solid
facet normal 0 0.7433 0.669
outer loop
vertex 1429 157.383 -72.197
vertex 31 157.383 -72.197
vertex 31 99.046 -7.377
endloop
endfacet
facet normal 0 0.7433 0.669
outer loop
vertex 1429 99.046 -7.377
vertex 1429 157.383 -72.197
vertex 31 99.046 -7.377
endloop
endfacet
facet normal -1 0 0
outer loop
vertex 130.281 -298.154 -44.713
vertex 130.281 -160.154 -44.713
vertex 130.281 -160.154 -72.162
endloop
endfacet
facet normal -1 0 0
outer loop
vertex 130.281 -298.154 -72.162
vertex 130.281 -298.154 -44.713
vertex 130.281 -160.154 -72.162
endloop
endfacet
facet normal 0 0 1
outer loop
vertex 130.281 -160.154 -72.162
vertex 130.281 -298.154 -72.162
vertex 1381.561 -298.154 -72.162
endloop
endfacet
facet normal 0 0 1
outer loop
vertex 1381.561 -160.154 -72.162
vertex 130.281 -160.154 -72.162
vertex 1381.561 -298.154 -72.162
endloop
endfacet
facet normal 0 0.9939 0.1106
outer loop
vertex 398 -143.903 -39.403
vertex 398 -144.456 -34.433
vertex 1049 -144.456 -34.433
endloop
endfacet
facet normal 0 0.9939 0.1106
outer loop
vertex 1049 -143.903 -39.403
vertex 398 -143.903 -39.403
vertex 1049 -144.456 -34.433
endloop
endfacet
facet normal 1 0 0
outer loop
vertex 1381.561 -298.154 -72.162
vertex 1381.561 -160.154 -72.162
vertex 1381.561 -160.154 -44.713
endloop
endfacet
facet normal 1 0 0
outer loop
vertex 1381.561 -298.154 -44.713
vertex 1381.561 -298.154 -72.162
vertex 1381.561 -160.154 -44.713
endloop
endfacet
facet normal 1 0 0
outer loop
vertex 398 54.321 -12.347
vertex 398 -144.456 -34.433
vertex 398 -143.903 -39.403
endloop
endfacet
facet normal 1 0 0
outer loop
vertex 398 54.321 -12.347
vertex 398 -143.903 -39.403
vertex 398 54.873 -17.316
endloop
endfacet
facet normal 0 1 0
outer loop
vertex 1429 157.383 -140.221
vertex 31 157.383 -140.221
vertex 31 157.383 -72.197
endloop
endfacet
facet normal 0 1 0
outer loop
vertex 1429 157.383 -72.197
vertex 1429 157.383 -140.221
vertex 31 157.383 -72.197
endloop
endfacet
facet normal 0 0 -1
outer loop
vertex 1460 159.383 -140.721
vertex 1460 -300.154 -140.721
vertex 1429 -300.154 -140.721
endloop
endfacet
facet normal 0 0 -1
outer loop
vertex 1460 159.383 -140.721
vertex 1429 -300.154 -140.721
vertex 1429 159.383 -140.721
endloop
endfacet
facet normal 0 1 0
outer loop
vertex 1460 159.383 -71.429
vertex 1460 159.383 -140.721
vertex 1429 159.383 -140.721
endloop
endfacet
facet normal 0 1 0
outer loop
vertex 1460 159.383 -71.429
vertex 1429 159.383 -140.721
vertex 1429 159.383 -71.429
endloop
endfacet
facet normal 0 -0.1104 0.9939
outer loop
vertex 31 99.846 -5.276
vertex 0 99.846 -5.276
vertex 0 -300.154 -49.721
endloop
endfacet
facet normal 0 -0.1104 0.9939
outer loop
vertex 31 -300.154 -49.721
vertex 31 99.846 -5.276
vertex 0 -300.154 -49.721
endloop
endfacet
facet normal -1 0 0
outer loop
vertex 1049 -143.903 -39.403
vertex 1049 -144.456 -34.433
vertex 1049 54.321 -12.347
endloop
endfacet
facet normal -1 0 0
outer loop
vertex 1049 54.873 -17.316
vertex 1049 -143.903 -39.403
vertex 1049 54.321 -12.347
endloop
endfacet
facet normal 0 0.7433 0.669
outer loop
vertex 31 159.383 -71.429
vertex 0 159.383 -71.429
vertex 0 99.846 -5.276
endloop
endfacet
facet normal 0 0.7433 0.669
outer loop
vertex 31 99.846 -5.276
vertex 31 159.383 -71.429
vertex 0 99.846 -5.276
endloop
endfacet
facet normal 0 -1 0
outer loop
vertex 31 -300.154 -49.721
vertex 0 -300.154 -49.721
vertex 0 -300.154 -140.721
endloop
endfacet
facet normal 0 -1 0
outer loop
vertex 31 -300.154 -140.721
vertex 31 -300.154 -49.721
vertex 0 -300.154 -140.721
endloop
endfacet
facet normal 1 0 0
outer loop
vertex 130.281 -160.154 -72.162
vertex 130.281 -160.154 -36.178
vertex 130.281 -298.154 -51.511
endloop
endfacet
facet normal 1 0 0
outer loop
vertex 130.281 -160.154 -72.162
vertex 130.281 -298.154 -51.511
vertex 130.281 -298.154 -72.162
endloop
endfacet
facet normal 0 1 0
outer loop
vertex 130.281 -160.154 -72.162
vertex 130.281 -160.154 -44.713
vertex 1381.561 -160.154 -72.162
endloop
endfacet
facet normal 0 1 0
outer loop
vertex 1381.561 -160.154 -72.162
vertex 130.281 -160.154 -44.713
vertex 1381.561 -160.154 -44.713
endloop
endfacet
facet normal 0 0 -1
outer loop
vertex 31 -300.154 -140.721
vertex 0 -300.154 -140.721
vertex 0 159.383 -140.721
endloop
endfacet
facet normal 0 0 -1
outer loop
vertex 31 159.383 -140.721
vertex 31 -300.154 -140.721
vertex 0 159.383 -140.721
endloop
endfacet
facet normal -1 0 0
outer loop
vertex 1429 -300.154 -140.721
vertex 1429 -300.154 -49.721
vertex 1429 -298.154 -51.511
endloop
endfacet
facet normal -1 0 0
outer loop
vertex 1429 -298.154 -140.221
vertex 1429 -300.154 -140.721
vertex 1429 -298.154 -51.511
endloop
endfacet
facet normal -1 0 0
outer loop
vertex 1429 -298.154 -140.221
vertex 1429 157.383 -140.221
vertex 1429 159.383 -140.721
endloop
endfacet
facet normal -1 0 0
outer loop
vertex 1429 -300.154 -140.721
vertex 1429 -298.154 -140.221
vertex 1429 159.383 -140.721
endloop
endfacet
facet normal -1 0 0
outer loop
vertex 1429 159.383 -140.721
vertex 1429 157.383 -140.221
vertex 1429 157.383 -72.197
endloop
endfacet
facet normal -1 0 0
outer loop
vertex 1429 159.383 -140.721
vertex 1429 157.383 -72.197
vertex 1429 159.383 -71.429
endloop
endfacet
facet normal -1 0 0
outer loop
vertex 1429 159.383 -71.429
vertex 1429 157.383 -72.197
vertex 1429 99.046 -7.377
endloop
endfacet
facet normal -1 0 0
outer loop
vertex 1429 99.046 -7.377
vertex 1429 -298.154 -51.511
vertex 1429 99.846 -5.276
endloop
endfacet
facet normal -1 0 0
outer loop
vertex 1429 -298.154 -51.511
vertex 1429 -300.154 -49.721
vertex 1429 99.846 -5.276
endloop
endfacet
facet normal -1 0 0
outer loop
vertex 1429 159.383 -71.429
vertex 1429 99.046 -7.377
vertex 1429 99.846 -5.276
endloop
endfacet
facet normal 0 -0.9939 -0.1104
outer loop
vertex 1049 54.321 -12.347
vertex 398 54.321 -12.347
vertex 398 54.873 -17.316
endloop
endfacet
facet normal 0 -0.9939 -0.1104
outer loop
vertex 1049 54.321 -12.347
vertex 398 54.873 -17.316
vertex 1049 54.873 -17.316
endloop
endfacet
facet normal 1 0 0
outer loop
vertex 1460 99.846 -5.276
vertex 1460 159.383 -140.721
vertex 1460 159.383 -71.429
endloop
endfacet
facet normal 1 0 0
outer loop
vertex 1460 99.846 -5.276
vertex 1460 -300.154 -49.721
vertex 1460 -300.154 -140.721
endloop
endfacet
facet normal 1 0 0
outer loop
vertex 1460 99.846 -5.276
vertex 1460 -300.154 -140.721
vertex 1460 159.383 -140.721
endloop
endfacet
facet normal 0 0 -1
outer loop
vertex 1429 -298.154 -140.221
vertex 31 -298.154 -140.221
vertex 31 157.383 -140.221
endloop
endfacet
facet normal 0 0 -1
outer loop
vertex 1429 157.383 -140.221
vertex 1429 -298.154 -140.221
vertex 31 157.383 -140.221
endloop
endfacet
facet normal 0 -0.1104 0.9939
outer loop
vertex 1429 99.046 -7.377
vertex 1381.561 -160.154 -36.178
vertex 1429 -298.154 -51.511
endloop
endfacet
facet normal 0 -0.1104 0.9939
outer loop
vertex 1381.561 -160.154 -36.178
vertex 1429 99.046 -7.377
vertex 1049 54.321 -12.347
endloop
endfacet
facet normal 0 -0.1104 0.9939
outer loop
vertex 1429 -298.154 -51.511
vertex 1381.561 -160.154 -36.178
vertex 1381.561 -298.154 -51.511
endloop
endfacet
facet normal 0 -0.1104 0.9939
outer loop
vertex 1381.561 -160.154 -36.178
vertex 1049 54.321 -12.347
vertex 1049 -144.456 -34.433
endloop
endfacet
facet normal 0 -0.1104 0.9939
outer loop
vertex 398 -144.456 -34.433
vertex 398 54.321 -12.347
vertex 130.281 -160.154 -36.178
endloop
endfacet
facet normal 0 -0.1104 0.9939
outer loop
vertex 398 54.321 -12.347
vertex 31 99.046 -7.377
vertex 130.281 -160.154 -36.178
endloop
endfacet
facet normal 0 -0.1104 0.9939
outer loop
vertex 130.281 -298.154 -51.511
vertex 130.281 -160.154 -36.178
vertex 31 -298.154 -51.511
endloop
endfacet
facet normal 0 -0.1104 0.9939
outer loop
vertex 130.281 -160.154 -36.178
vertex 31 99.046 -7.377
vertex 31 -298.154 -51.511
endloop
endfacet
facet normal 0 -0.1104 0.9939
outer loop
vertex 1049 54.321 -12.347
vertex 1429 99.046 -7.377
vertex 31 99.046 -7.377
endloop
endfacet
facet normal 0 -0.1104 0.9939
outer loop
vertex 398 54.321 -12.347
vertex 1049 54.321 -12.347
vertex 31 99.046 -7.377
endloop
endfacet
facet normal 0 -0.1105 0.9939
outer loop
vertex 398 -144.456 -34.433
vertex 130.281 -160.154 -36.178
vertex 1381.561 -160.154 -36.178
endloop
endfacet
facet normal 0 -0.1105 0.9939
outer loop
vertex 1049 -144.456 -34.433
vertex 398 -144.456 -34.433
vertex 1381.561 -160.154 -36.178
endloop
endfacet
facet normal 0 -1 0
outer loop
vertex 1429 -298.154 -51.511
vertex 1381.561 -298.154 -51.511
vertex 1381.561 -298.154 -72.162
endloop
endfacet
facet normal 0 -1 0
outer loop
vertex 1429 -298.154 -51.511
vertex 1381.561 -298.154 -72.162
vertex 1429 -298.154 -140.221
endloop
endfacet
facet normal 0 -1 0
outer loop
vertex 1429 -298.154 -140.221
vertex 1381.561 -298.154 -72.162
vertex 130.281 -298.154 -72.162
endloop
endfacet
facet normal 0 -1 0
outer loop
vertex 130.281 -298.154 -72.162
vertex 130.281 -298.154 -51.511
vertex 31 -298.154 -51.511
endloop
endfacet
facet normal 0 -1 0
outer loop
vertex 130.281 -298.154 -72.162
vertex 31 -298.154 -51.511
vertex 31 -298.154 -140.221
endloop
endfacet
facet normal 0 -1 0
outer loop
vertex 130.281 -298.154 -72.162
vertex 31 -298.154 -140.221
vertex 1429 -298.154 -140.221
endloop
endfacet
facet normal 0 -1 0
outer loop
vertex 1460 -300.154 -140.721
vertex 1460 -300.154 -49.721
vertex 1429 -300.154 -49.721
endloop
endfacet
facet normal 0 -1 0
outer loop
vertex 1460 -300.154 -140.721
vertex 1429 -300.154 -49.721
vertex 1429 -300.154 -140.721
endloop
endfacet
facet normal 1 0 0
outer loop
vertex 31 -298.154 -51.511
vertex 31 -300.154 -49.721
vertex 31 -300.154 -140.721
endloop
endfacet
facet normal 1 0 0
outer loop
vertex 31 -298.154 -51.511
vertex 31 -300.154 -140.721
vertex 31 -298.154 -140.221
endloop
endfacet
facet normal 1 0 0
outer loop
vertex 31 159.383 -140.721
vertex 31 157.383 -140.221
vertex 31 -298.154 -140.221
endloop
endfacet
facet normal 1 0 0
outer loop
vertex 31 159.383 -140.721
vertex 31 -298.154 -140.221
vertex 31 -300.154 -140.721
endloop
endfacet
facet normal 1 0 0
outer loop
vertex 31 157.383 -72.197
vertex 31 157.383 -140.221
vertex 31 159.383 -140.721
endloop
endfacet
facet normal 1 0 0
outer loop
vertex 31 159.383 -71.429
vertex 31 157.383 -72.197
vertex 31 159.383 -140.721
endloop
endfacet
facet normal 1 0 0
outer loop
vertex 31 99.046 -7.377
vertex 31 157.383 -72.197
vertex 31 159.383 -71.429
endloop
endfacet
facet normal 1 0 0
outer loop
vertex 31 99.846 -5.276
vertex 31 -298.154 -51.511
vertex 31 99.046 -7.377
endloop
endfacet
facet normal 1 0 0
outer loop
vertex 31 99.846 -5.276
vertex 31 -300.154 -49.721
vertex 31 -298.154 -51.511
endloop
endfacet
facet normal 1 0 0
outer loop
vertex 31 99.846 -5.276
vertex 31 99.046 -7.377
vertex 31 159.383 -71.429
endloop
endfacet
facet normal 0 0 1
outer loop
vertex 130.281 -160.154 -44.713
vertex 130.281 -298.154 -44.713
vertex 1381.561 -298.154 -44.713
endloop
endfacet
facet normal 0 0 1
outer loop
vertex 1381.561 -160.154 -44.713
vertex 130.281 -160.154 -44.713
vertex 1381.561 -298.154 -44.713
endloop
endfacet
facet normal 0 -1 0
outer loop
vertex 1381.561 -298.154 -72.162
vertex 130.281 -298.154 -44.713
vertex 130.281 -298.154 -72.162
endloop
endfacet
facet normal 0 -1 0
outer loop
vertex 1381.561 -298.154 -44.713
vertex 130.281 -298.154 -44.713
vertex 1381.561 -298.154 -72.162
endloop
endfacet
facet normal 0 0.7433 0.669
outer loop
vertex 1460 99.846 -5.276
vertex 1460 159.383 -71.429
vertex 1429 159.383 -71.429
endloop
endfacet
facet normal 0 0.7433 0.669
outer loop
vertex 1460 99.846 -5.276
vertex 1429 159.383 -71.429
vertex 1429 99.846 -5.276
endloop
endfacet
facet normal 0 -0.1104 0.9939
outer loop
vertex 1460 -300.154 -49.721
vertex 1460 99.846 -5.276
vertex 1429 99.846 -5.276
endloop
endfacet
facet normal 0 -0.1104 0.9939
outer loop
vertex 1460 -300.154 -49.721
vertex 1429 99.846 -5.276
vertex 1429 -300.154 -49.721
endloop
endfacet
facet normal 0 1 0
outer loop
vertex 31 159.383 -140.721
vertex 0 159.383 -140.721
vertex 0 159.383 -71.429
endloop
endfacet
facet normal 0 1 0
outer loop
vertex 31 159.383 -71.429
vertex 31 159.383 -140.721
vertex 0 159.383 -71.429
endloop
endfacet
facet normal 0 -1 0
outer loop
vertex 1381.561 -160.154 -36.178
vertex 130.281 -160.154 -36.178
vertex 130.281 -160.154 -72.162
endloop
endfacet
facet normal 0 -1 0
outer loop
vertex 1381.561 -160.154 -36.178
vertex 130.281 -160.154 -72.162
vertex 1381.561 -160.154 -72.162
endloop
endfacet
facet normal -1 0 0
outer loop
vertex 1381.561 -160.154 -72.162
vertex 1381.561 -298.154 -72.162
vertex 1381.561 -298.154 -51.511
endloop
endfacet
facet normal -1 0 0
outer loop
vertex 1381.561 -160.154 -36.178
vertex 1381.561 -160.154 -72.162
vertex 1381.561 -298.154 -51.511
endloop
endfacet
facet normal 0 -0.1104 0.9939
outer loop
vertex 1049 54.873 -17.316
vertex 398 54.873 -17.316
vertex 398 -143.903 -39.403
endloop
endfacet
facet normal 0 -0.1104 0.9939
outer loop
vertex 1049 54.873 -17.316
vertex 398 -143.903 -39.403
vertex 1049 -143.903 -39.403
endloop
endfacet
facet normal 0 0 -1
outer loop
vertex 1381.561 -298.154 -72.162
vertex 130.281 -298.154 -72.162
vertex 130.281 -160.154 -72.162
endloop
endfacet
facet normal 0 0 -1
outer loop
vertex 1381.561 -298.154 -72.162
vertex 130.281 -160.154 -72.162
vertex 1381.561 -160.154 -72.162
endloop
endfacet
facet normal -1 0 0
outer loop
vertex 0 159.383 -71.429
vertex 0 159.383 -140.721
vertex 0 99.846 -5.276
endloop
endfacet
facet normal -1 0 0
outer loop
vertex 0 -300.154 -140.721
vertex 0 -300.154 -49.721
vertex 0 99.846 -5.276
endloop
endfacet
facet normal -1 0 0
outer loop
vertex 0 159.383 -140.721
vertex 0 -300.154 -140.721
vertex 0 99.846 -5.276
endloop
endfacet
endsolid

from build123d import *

# Parameters (mm, degrees)
F1_DEPTH = 1460
F2_DEPTH = 31
F4_DEPTH = 31
F5_W     = 651
F5_H     = 200
F6_DEPTH = 5
F7_W     = 1251.2797813466
F7_H     = 20.6513455533
F7_H_2   = 10.7806026936
F7_H_3   = 6.7979232944
F8_DEPTH = 138
F9_DEPTH = 138


with BuildPart() as f1:
    # F0 (on Right) → F1 (new body)
    with BuildSketch(Plane.YZ):
        Polygon((99.0458952926, -7.3774666747), (-298.1544249058, -51.5108355857), (-298.1544249058, -140.2207499994), (157.3834362086, -140.2207499994), (157.3834362086, -72.1969565814), align=None)
    extrude(amount=F1_DEPTH)

    # F0 (on Right) → F2 (join)
    with BuildSketch(Plane.YZ):
        Polygon((159.3834362086, -140.7207499994), (159.3834362086, -71.429484571), (99.8455750942, -5.276305555), (-300.1544249058, -49.7207499994), (-300.1544249058, -140.7207499994), align=None)
        Polygon((-298.1544249058, -140.2207499994), (-298.1544249058, -51.5108355857), (99.0458952926, -7.3774666747), (157.3834362086, -72.1969565814), (157.3834362086, -140.2207499994), align=None, mode=Mode.SUBTRACT)
    extrude(amount=F2_DEPTH)

    # F3 (on face) → F4 (join)
    with BuildSketch(Plane.YZ.offset(1460)):
        Polygon((159.3834362086, -140.7207499994), (159.3834362086, -71.429484571), (99.8455750942, -5.276305555), (-300.1544249058, -49.7207499994), (-300.1544249058, -140.7207499994), align=None)
        Polygon((-298.1544249058, -140.2207499994), (-298.1544249058, -51.5108355857), (99.0458952926, -7.3774666747), (157.3834362086, -72.1969565814), (157.3834362086, -140.2207499994), align=None, mode=Mode.SUBTRACT)
    extrude(amount=-F4_DEPTH)

    # F5 (on face) → F6 (cut)
    with BuildSketch(Plane(origin=(0, 2.017598724, -18.1583885157), x_dir=(1, 0, 0), z_dir=(0, -0.1104315261, 0.9938837347))):
        with Locations((723.5, -47.374600586)):
            Rectangle(F5_W, F5_H)
    extrude(amount=-F6_DEPTH, mode=Mode.SUBTRACT)

    # F7 (on face) → F8 (cut)
    with BuildSketch(Plane.XZ.offset(298.1544249058)):
        with Locations((755.9206733678, -61.8365083623)):
            Rectangle(F7_W, F7_H)
        with Locations((755.9206733678, -39.3226109445)):
            Rectangle(F7_W, F7_H_2)
        with Locations((755.9206733678, -48.1118739385)):
            Rectangle(F7_W, F7_H_3)
    extrude(amount=-F8_DEPTH, mode=Mode.SUBTRACT)


with BuildPart() as f9:
    # F7 (on face) → F9 (new body)
    with BuildSketch(Plane.XZ.offset(298.1544249058)):
        with Locations((755.9206733678, -61.8365083623)):
            Rectangle(F7_W, F7_H)
        with Locations((755.9206733678, -48.1118739385)):
            Rectangle(F7_W, F7_H_3)
    extrude(amount=-F9_DEPTH)


solid = Compound([f1.part, f9.part])
